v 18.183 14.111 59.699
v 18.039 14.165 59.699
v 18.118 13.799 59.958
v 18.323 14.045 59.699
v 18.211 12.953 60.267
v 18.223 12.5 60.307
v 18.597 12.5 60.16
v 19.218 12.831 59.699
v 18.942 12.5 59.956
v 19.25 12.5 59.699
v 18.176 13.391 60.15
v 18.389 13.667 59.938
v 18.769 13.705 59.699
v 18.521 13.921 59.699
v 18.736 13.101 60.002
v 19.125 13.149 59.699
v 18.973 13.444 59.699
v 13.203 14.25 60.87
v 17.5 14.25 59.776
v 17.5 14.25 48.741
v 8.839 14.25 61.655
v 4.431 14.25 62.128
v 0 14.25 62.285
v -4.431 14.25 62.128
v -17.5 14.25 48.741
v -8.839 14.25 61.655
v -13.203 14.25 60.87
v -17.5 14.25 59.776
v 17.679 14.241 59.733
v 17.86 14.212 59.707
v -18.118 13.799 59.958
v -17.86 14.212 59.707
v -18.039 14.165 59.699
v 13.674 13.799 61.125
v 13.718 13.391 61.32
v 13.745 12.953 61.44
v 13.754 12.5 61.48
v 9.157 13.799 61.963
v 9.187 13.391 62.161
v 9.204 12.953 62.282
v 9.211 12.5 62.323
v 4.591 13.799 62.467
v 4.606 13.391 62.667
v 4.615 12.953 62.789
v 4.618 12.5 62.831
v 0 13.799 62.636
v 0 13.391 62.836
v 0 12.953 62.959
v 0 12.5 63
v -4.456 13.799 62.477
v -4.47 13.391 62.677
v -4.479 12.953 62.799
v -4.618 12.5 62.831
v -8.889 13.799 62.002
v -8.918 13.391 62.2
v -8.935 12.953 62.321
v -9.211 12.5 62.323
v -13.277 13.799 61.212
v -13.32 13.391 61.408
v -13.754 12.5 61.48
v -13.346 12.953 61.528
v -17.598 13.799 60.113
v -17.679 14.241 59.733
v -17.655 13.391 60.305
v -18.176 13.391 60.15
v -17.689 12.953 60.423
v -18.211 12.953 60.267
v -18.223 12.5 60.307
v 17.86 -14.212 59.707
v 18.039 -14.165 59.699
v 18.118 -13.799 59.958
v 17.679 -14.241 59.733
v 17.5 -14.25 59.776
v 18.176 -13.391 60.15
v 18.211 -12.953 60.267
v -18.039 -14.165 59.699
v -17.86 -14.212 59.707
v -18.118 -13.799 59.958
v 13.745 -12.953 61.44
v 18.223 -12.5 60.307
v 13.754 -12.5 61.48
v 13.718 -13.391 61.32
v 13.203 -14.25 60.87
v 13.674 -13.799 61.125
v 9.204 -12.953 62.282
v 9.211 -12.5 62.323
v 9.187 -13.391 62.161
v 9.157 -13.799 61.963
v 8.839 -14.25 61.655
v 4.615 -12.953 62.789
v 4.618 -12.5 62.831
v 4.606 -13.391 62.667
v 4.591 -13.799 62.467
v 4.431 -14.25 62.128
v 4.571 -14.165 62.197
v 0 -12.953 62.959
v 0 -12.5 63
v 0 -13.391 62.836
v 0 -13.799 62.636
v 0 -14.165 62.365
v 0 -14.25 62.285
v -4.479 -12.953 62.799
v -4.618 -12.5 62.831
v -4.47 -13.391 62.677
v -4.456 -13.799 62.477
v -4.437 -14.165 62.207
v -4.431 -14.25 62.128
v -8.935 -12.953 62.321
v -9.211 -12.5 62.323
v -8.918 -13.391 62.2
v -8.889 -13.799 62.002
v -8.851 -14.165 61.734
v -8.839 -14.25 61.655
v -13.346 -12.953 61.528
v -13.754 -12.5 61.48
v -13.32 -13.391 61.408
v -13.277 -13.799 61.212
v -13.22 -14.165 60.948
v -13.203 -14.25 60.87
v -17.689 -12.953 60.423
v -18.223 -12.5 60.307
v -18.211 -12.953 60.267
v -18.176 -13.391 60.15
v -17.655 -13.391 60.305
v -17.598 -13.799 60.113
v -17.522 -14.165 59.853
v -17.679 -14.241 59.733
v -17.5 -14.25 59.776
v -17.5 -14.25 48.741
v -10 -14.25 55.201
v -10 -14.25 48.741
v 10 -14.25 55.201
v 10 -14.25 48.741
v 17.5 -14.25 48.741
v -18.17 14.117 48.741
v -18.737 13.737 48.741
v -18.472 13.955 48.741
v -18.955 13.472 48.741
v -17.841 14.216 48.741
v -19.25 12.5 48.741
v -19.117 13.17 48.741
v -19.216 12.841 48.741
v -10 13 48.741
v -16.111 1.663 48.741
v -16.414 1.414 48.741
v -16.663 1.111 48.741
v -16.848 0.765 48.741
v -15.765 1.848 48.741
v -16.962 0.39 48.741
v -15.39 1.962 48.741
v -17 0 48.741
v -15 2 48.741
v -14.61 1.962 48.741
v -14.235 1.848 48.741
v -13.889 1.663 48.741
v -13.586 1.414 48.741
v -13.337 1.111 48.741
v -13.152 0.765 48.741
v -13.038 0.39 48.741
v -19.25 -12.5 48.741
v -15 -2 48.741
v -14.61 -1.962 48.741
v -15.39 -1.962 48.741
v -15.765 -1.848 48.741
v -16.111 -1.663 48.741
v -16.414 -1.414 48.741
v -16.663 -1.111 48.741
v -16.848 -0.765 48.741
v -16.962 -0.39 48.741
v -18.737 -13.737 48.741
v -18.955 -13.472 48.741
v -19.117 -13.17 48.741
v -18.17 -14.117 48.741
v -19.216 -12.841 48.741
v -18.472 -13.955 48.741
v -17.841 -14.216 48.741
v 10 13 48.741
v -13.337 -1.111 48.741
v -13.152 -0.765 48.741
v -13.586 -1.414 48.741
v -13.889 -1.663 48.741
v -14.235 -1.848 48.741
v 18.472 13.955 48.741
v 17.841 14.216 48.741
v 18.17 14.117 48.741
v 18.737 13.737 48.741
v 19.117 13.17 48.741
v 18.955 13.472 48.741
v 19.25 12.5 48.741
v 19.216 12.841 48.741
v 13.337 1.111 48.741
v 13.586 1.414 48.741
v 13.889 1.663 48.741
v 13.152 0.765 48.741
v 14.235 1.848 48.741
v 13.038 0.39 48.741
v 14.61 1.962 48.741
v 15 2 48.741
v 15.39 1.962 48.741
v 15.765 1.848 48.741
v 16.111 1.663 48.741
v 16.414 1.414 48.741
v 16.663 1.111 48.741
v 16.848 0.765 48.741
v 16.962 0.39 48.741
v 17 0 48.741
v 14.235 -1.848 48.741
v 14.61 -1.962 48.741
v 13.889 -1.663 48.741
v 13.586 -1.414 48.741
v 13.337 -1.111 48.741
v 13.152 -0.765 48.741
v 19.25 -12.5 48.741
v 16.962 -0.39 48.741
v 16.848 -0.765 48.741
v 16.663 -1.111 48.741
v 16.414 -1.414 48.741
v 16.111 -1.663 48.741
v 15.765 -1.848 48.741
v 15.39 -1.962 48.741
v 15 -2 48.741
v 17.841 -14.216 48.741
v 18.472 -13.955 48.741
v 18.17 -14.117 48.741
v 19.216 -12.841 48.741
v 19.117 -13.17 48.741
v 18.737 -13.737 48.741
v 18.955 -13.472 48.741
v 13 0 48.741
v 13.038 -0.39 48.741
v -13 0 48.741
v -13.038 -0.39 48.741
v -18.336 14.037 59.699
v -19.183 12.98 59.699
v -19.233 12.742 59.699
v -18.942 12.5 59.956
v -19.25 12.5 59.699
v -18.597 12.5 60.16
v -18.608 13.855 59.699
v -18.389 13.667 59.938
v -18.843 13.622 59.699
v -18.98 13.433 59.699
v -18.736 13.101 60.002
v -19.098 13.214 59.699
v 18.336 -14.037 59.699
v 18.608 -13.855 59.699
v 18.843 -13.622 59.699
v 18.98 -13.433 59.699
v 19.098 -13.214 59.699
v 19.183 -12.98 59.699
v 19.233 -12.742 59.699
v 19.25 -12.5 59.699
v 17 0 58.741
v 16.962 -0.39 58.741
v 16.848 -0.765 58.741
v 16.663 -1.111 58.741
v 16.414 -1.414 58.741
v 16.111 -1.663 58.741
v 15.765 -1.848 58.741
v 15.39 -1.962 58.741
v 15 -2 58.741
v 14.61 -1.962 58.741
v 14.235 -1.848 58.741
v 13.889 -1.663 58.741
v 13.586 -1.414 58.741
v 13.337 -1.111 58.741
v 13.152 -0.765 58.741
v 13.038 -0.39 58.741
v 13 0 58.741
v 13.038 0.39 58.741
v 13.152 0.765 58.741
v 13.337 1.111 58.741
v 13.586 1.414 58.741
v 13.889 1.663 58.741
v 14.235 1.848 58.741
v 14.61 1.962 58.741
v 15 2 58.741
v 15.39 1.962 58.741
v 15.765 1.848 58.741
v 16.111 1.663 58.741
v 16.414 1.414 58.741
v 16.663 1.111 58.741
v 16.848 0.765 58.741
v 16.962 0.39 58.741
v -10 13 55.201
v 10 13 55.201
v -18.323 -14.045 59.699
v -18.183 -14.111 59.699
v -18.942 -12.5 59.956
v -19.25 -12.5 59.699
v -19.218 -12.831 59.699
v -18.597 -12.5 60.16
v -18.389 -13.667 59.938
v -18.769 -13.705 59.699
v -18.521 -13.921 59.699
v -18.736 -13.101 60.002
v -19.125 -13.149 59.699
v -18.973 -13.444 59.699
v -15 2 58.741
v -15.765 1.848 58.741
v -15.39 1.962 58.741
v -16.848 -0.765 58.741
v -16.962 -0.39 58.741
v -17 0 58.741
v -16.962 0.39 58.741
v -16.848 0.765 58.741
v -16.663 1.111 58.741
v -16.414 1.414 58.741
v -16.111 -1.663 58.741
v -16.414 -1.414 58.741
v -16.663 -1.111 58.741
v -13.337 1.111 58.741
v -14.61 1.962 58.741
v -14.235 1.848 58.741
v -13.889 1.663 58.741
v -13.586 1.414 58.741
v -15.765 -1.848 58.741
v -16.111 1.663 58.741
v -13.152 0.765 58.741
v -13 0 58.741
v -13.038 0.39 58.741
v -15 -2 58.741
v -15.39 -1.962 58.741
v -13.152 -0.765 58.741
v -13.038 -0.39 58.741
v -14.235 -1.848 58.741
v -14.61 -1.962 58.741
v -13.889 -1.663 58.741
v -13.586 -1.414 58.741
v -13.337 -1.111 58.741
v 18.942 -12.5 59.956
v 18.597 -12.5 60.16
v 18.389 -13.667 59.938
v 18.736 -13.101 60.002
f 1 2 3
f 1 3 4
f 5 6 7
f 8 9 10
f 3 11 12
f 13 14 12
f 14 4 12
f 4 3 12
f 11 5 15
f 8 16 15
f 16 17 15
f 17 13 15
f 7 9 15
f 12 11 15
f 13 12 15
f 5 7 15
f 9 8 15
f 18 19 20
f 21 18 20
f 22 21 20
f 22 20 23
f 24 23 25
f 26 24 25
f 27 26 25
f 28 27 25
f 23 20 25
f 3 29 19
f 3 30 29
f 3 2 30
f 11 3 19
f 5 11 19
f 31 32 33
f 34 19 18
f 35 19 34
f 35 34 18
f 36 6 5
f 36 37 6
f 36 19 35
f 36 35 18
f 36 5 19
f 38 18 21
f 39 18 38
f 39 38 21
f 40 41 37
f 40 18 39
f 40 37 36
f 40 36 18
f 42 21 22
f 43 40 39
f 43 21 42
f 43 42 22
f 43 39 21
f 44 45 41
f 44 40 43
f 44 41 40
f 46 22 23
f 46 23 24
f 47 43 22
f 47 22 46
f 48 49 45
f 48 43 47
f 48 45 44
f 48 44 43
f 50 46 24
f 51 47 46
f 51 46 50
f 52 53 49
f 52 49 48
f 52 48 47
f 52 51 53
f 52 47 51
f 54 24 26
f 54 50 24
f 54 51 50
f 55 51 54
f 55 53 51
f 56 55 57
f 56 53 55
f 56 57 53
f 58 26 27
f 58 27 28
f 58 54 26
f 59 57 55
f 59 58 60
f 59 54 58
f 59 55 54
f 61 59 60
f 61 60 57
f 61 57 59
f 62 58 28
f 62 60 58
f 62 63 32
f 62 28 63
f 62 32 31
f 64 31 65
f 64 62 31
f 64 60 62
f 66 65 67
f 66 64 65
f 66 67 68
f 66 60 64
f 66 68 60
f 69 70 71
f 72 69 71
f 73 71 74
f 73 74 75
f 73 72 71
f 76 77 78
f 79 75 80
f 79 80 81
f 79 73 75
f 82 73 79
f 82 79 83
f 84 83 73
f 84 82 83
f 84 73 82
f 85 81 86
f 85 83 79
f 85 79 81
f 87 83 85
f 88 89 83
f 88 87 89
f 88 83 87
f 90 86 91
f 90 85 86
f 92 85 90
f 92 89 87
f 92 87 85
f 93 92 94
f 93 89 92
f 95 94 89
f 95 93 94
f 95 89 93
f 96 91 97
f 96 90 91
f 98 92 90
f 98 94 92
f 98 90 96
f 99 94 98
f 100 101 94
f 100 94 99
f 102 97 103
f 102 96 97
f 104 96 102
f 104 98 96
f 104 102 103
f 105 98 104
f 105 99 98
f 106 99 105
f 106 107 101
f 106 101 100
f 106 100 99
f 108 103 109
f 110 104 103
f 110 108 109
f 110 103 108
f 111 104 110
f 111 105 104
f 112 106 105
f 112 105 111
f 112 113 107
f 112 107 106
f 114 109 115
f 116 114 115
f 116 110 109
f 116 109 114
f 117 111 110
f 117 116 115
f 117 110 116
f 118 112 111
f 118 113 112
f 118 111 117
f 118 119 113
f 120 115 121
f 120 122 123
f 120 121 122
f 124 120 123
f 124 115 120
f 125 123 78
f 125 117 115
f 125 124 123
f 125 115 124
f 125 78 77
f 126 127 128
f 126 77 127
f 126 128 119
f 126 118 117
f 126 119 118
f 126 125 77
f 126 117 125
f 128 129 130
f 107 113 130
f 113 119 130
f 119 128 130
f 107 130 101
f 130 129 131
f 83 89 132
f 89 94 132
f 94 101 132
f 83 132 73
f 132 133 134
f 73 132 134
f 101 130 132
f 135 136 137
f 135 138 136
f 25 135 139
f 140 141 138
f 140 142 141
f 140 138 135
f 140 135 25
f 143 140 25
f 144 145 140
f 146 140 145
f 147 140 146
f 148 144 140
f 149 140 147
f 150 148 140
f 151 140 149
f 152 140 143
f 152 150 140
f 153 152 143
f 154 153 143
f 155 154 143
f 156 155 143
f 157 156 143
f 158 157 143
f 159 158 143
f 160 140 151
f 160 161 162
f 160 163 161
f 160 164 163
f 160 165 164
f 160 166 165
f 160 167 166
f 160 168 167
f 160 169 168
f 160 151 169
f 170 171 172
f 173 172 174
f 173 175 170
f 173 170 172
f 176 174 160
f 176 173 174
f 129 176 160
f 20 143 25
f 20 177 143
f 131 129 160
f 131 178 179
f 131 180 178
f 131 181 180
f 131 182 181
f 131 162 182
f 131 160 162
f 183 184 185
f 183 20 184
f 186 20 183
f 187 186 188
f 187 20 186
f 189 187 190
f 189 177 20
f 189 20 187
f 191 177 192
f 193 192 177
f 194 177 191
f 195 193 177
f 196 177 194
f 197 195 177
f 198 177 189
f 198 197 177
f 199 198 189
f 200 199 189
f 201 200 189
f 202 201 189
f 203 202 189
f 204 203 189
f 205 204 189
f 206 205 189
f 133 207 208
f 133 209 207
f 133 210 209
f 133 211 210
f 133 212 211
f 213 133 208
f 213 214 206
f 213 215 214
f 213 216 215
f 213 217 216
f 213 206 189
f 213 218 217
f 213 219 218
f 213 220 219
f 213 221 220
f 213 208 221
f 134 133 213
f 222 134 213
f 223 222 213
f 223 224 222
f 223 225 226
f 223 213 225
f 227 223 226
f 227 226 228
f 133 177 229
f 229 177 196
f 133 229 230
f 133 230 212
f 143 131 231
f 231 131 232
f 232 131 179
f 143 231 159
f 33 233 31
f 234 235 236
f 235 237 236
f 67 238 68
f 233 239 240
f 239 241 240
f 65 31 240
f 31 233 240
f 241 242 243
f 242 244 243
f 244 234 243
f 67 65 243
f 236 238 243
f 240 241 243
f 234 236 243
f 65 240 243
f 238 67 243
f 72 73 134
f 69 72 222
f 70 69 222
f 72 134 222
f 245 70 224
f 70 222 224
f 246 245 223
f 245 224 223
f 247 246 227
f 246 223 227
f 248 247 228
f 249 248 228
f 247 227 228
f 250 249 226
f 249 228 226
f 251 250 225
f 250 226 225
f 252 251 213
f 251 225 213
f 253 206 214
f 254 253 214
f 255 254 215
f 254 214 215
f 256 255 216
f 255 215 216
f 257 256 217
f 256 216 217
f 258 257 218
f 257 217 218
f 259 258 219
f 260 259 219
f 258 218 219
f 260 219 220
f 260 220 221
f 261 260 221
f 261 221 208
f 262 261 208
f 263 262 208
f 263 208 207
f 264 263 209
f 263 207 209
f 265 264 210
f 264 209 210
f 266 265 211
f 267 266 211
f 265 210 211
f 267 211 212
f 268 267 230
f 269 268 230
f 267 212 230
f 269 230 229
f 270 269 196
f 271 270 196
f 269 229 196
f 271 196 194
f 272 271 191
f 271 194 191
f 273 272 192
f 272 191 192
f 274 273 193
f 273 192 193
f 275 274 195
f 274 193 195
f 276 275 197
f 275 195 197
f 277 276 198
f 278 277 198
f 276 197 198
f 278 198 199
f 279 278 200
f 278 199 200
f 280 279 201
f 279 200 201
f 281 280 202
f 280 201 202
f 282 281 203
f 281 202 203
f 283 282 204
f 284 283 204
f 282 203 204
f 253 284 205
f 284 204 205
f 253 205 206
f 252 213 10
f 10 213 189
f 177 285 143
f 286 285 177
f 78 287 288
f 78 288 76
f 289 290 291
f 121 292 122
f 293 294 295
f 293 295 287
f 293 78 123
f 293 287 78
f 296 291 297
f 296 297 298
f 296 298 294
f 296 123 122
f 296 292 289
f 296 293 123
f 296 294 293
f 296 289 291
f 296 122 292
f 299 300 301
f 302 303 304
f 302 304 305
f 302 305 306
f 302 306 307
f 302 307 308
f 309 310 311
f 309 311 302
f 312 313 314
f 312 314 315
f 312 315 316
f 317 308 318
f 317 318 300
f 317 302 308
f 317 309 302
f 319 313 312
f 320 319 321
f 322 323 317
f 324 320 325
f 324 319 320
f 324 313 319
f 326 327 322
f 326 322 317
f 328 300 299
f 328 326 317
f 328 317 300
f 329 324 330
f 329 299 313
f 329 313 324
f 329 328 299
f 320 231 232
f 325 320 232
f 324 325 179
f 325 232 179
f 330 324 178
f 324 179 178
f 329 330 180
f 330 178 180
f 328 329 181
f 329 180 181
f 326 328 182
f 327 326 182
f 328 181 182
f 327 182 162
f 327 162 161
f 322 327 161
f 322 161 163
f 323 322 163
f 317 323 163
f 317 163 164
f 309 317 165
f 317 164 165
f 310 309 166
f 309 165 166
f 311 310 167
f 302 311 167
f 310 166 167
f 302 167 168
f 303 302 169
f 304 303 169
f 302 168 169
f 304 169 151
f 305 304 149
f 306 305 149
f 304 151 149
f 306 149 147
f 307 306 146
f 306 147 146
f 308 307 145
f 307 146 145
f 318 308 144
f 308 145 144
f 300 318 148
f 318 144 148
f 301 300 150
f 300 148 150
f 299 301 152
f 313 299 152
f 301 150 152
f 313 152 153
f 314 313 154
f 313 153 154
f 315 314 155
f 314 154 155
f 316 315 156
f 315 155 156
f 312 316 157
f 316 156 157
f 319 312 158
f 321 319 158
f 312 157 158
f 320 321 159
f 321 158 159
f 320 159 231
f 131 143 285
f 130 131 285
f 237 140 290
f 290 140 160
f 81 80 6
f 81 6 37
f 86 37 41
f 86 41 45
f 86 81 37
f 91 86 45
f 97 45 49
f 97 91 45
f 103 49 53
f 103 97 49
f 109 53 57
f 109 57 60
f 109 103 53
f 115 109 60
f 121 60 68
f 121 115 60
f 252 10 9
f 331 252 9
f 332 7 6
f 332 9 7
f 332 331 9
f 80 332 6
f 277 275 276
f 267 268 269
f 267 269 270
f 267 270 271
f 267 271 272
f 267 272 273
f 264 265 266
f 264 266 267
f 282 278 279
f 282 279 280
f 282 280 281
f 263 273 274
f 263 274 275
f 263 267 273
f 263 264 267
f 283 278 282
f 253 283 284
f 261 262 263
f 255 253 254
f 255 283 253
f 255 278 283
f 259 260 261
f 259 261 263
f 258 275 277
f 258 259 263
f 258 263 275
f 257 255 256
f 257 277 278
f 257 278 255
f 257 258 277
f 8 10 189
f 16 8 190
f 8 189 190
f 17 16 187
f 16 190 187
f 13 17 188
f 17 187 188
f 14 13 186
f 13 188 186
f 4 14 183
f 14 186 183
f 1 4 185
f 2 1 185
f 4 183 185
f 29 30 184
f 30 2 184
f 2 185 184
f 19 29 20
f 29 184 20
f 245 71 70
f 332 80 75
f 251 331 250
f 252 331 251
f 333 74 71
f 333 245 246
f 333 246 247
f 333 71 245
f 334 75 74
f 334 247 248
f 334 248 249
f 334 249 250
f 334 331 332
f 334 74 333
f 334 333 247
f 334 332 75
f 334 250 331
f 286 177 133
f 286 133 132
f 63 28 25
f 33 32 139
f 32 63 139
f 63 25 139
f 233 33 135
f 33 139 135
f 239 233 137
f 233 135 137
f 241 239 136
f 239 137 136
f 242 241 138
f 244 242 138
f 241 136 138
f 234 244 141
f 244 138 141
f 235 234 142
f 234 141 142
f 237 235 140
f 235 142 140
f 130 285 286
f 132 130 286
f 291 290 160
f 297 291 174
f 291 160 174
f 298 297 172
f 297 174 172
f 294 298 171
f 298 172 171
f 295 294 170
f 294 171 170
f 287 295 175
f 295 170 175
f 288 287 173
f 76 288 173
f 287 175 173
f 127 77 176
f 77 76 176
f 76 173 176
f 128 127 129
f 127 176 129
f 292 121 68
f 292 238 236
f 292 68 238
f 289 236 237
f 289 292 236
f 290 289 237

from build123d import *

# Parameters (mm, degrees)
F1_DEPTH = 15
F2_W     = 20
F2_H     = 55.2012861603
F3_DEPTH = 13
F4_R     = 2
F5_DEPTH = 10
F6_R     = 2.5
F8_DEPTH = 14.259891975
F9_DEPTH = 1.2510001


with BuildPart() as f1:
    # F0 (on Front) → F1 (new body, symmetric)
    with BuildSketch(Plane.XZ):
        with BuildLine():
            Line((20, 48.741108125), (20, 59.741108125))
            ThreePointArc((20, 59.741108125), (0, 63), (-20, 59.741108125))
            Line((-20, 59.741108125), (-20, 48.741108125))
            Line((-20, 48.741108125), (20, 48.741108125))
        make_face()
    extrude(amount=F1_DEPTH, both=True)

    # F2 (on Front) → F3 (cut, symmetric)
    with BuildSketch(Plane.XZ):
        with Locations((0, 27.6006430802)):
            Rectangle(F2_W, F2_H)
    extrude(amount=F3_DEPTH, both=True, mode=Mode.SUBTRACT)

    # F4 (on face) → F5 (cut)
    with BuildSketch(Plane(origin=(0, 0, 48.741108125), x_dir=(1, 0, 0), z_dir=(0, 0, -1))):
        with Locations((-15, 0)):
            Circle(F4_R)
        with Locations((15, 0)):
            Circle(F4_R)
    extrude(amount=-F5_DEPTH, mode=Mode.SUBTRACT)

    # F6
    f6_edges = [f1.edges().sort_by_distance(p)[0] for p in [
        (-20, -15, 54.241108),
        (-20, 15, 54.241108),
        (20, -15, 54.241108),
        (20, 15, 54.241108),
        (20, 0, 59.741108),
        (0, -15, 63),
        (0, 15, 63),
        (-20, 0, 59.741108),
    ]]
    fillet(f6_edges, radius=F6_R)

    # F7 (on face) → F8 (cut, through all)
    with BuildSketch(Plane(origin=(0, 0, 48.741108125), x_dir=(1, 0, 0), z_dir=(0, 0, -1))):
        with BuildLine():
            Line((17.5, 15), (-17.5, 15))
            ThreePointArc((-17.5, 15), (-19.267766953, 14.267766953), (-20, 12.5))
            Line((-20, 12.5), (-20, -12.5))
            ThreePointArc((-20, -12.5), (-19.267766953, -14.267766953), (-17.5, -15))
            Line((-17.5, -15), (17.5, -15))
            ThreePointArc((17.5, -15), (19.267766953, -14.267766953), (20, -12.5))
            Line((20, -12.5), (20, 12.5))
            ThreePointArc((20, 12.5), (19.267766953, 14.267766953), (17.5, 15))
        make_face()
        with BuildLine():
            Line((-19.25, -12.5), (-19.25, 12.5))
            ThreePointArc((-19.25, 12.5), (-18.7374368671, 13.7374368671), (-17.5, 14.25))
            Line((-17.5, 14.25), (17.5, 14.25))
            ThreePointArc((17.5, 14.25), (18.7374368671, 13.7374368671), (19.25, 12.5))
            Line((19.25, 12.5), (19.25, -12.5))
            ThreePointArc((19.25, -12.5), (18.7374368671, -13.7374368671), (17.5, -14.25))
            Line((17.5, -14.25), (-17.5, -14.25))
            ThreePointArc((-17.5, -14.25), (-18.7374368671, -13.7374368671), (-19.25, -12.5))
        make_face(mode=Mode.SUBTRACT)
    extrude(amount=-F8_DEPTH, mode=Mode.SUBTRACT)

    # F9 (cut, through all): a face of the model
    f9_faces = [f1.faces().sort_by_distance(p)[0] for p in [
        (0, -13, 51.9711971427),
    ]]
    extrude(f9_faces, amount=-F9_DEPTH, mode=Mode.SUBTRACT)


solid = f1.part
